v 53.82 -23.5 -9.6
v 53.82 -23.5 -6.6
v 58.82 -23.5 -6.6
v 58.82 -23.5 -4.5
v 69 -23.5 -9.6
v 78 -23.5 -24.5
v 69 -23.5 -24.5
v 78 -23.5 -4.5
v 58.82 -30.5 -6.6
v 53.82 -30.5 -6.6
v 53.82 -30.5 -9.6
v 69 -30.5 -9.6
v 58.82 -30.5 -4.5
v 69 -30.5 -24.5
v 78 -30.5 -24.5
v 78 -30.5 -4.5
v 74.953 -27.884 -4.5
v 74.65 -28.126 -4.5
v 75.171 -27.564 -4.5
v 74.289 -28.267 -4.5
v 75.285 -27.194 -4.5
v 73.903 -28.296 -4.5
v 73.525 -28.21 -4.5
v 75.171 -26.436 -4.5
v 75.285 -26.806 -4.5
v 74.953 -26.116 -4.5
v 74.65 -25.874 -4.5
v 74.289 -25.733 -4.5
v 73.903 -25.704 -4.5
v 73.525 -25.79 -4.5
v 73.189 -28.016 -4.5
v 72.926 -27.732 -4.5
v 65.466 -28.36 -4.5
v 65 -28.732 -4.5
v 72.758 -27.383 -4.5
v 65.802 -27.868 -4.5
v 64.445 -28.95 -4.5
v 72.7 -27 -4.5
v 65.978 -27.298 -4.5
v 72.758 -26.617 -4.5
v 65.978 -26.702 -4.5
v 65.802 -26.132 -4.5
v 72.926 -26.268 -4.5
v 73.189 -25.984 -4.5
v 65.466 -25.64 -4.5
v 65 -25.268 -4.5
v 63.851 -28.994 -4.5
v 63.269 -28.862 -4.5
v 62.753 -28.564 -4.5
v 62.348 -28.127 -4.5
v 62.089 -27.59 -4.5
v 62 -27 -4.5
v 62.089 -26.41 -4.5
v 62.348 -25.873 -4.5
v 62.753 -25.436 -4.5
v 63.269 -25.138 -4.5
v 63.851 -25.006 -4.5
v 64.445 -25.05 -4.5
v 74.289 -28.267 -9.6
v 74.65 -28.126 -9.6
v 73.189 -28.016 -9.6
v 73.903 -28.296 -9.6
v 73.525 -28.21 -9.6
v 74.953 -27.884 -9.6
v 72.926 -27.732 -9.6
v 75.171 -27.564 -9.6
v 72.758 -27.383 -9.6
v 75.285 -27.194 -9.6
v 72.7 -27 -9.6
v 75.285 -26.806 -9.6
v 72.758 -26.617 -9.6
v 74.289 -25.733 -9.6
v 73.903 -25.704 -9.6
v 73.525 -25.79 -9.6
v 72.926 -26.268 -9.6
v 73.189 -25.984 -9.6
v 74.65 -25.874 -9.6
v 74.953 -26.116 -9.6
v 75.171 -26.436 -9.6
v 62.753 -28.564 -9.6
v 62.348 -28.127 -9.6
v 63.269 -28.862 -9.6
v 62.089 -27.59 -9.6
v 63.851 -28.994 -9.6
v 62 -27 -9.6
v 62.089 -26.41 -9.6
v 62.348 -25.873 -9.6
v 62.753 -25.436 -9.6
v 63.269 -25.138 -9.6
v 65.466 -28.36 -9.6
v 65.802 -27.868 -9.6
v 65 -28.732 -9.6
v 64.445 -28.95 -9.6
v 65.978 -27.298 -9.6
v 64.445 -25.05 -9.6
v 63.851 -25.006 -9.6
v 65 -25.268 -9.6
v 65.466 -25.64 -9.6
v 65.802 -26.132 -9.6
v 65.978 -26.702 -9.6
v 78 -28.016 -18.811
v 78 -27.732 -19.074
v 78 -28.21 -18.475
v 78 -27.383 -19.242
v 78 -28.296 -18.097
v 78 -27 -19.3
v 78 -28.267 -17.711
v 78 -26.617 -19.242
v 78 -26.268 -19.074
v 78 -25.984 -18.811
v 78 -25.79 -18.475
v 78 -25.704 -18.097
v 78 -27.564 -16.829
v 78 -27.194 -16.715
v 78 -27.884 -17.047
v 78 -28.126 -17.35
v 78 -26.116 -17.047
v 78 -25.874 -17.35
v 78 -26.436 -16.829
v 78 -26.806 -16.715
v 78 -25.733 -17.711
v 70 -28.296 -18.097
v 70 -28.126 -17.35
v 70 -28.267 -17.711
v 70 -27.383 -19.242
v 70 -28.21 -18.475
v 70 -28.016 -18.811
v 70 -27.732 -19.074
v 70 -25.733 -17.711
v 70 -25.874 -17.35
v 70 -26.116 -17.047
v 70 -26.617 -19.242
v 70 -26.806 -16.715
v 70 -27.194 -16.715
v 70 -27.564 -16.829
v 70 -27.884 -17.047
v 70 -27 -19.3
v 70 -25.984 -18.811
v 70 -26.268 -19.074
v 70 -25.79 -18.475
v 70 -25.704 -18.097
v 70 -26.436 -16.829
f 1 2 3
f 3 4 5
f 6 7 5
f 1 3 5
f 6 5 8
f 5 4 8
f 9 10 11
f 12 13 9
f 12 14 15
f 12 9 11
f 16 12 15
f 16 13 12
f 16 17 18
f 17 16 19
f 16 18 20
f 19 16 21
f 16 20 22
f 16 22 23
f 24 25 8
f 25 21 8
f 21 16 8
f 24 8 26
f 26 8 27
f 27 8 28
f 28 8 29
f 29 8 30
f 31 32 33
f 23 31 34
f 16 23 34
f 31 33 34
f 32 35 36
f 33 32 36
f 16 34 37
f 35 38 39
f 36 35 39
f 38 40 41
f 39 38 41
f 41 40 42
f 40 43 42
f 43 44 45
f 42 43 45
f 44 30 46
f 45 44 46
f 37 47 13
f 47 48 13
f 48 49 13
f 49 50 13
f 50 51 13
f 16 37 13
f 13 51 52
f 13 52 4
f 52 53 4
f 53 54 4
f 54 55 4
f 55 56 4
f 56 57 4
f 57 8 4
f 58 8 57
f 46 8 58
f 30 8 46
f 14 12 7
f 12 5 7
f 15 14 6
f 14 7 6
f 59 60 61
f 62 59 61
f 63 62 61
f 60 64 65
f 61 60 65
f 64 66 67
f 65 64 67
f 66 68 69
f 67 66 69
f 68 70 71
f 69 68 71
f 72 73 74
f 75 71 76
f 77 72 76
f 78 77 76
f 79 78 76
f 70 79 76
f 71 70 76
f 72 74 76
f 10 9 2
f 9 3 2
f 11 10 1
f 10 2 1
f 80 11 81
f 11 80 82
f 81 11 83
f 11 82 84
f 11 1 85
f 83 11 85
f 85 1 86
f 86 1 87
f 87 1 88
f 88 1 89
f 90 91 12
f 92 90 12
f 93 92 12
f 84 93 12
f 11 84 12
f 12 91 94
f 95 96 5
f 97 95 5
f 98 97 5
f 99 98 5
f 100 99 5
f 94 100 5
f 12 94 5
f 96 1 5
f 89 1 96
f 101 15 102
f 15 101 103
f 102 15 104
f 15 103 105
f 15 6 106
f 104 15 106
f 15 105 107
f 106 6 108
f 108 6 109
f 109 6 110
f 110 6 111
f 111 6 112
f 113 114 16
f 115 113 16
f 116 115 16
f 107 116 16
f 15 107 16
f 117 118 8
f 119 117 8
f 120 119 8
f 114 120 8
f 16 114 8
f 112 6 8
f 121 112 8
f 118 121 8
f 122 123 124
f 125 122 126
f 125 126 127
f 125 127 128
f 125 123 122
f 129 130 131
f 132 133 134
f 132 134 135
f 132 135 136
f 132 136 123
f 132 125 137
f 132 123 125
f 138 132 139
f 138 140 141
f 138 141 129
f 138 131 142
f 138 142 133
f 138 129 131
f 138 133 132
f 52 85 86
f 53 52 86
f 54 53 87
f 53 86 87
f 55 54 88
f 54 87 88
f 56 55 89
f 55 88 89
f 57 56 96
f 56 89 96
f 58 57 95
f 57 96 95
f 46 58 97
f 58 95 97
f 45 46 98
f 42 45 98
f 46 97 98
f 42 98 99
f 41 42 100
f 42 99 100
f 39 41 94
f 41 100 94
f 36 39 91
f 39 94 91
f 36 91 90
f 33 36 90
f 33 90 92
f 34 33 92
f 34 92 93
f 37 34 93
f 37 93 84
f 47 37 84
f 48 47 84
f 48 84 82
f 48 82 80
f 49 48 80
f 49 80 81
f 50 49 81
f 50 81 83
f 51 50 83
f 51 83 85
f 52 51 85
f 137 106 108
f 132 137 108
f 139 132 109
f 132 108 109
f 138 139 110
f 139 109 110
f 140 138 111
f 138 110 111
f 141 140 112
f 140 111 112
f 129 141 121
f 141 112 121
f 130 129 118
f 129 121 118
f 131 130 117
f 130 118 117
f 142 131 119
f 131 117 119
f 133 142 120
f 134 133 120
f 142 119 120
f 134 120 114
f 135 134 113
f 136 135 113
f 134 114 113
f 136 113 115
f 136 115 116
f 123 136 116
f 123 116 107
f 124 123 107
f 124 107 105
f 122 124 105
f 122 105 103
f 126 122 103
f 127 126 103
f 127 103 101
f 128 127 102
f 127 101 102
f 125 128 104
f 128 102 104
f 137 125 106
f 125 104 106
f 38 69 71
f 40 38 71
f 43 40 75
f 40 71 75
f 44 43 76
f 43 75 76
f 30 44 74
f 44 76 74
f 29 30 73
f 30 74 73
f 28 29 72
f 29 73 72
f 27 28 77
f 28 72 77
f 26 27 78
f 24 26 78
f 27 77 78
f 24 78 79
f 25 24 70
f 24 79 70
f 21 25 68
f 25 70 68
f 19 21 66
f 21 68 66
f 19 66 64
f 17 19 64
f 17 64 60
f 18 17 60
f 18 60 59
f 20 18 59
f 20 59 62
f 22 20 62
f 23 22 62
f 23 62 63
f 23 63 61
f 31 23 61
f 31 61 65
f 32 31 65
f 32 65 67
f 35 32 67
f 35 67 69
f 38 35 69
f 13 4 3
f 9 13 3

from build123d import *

# Parameters (mm, degrees)
PAD025_DEPTH             = 3.5
PAD025_DEPTH_BACK        = 3.5
SKETCH047_R              = 2
SKETCH047_R_2            = 1.3
POCKET_DEPTH             = 8
SKETCH049_R              = 1.3
POCKET001_DEPTH          = 8
CLONE010_PLACEMENT_ANGLE = 180


with BuildPart() as part:
    # Sketch → Pad025 (new body, two sides)
    with BuildSketch(Plane.XZ) as pad025_sk:
        Polygon((-58.82, -4.5), (-58.82, -6.6), (-53.82, -6.6), (-53.82, -9.6), (-69, -9.6), (-69, -24.5), (-78, -24.5), (-78, -4.5), align=None)
    extrude(amount=PAD025_DEPTH)
    extrude(pad025_sk.sketch, amount=-PAD025_DEPTH_BACK)

    # Sketch047 → Pocket (cut)
    with BuildSketch(Plane(origin=(0, 0, -9.6), x_dir=(1, 0, 0), z_dir=(0, 0, -1))):
        with Locations((-64, 0)):
            Circle(SKETCH047_R)
        with Locations((-74, 0)):
            Circle(SKETCH047_R_2)
    extrude(amount=-POCKET_DEPTH, mode=Mode.SUBTRACT)

    # Sketch049 → Pocket001 (cut)
    with BuildSketch(Plane(origin=(-78, 0, 0), x_dir=(0, 0, -1), z_dir=(-1, 0, 0))):
        with Locations((18, 0)):
            Circle(SKETCH049_R)
    extrude(amount=-POCKET001_DEPTH, mode=Mode.SUBTRACT)


with BuildPart() as part_1:
    # Clone010 placement: moved
    add(part.part.moved(Location((0, -27, 0))).rotate(Axis((0, -27, 0), (0, 0, 1)), CLONE010_PLACEMENT_ANGLE))


solid = part_1.part
